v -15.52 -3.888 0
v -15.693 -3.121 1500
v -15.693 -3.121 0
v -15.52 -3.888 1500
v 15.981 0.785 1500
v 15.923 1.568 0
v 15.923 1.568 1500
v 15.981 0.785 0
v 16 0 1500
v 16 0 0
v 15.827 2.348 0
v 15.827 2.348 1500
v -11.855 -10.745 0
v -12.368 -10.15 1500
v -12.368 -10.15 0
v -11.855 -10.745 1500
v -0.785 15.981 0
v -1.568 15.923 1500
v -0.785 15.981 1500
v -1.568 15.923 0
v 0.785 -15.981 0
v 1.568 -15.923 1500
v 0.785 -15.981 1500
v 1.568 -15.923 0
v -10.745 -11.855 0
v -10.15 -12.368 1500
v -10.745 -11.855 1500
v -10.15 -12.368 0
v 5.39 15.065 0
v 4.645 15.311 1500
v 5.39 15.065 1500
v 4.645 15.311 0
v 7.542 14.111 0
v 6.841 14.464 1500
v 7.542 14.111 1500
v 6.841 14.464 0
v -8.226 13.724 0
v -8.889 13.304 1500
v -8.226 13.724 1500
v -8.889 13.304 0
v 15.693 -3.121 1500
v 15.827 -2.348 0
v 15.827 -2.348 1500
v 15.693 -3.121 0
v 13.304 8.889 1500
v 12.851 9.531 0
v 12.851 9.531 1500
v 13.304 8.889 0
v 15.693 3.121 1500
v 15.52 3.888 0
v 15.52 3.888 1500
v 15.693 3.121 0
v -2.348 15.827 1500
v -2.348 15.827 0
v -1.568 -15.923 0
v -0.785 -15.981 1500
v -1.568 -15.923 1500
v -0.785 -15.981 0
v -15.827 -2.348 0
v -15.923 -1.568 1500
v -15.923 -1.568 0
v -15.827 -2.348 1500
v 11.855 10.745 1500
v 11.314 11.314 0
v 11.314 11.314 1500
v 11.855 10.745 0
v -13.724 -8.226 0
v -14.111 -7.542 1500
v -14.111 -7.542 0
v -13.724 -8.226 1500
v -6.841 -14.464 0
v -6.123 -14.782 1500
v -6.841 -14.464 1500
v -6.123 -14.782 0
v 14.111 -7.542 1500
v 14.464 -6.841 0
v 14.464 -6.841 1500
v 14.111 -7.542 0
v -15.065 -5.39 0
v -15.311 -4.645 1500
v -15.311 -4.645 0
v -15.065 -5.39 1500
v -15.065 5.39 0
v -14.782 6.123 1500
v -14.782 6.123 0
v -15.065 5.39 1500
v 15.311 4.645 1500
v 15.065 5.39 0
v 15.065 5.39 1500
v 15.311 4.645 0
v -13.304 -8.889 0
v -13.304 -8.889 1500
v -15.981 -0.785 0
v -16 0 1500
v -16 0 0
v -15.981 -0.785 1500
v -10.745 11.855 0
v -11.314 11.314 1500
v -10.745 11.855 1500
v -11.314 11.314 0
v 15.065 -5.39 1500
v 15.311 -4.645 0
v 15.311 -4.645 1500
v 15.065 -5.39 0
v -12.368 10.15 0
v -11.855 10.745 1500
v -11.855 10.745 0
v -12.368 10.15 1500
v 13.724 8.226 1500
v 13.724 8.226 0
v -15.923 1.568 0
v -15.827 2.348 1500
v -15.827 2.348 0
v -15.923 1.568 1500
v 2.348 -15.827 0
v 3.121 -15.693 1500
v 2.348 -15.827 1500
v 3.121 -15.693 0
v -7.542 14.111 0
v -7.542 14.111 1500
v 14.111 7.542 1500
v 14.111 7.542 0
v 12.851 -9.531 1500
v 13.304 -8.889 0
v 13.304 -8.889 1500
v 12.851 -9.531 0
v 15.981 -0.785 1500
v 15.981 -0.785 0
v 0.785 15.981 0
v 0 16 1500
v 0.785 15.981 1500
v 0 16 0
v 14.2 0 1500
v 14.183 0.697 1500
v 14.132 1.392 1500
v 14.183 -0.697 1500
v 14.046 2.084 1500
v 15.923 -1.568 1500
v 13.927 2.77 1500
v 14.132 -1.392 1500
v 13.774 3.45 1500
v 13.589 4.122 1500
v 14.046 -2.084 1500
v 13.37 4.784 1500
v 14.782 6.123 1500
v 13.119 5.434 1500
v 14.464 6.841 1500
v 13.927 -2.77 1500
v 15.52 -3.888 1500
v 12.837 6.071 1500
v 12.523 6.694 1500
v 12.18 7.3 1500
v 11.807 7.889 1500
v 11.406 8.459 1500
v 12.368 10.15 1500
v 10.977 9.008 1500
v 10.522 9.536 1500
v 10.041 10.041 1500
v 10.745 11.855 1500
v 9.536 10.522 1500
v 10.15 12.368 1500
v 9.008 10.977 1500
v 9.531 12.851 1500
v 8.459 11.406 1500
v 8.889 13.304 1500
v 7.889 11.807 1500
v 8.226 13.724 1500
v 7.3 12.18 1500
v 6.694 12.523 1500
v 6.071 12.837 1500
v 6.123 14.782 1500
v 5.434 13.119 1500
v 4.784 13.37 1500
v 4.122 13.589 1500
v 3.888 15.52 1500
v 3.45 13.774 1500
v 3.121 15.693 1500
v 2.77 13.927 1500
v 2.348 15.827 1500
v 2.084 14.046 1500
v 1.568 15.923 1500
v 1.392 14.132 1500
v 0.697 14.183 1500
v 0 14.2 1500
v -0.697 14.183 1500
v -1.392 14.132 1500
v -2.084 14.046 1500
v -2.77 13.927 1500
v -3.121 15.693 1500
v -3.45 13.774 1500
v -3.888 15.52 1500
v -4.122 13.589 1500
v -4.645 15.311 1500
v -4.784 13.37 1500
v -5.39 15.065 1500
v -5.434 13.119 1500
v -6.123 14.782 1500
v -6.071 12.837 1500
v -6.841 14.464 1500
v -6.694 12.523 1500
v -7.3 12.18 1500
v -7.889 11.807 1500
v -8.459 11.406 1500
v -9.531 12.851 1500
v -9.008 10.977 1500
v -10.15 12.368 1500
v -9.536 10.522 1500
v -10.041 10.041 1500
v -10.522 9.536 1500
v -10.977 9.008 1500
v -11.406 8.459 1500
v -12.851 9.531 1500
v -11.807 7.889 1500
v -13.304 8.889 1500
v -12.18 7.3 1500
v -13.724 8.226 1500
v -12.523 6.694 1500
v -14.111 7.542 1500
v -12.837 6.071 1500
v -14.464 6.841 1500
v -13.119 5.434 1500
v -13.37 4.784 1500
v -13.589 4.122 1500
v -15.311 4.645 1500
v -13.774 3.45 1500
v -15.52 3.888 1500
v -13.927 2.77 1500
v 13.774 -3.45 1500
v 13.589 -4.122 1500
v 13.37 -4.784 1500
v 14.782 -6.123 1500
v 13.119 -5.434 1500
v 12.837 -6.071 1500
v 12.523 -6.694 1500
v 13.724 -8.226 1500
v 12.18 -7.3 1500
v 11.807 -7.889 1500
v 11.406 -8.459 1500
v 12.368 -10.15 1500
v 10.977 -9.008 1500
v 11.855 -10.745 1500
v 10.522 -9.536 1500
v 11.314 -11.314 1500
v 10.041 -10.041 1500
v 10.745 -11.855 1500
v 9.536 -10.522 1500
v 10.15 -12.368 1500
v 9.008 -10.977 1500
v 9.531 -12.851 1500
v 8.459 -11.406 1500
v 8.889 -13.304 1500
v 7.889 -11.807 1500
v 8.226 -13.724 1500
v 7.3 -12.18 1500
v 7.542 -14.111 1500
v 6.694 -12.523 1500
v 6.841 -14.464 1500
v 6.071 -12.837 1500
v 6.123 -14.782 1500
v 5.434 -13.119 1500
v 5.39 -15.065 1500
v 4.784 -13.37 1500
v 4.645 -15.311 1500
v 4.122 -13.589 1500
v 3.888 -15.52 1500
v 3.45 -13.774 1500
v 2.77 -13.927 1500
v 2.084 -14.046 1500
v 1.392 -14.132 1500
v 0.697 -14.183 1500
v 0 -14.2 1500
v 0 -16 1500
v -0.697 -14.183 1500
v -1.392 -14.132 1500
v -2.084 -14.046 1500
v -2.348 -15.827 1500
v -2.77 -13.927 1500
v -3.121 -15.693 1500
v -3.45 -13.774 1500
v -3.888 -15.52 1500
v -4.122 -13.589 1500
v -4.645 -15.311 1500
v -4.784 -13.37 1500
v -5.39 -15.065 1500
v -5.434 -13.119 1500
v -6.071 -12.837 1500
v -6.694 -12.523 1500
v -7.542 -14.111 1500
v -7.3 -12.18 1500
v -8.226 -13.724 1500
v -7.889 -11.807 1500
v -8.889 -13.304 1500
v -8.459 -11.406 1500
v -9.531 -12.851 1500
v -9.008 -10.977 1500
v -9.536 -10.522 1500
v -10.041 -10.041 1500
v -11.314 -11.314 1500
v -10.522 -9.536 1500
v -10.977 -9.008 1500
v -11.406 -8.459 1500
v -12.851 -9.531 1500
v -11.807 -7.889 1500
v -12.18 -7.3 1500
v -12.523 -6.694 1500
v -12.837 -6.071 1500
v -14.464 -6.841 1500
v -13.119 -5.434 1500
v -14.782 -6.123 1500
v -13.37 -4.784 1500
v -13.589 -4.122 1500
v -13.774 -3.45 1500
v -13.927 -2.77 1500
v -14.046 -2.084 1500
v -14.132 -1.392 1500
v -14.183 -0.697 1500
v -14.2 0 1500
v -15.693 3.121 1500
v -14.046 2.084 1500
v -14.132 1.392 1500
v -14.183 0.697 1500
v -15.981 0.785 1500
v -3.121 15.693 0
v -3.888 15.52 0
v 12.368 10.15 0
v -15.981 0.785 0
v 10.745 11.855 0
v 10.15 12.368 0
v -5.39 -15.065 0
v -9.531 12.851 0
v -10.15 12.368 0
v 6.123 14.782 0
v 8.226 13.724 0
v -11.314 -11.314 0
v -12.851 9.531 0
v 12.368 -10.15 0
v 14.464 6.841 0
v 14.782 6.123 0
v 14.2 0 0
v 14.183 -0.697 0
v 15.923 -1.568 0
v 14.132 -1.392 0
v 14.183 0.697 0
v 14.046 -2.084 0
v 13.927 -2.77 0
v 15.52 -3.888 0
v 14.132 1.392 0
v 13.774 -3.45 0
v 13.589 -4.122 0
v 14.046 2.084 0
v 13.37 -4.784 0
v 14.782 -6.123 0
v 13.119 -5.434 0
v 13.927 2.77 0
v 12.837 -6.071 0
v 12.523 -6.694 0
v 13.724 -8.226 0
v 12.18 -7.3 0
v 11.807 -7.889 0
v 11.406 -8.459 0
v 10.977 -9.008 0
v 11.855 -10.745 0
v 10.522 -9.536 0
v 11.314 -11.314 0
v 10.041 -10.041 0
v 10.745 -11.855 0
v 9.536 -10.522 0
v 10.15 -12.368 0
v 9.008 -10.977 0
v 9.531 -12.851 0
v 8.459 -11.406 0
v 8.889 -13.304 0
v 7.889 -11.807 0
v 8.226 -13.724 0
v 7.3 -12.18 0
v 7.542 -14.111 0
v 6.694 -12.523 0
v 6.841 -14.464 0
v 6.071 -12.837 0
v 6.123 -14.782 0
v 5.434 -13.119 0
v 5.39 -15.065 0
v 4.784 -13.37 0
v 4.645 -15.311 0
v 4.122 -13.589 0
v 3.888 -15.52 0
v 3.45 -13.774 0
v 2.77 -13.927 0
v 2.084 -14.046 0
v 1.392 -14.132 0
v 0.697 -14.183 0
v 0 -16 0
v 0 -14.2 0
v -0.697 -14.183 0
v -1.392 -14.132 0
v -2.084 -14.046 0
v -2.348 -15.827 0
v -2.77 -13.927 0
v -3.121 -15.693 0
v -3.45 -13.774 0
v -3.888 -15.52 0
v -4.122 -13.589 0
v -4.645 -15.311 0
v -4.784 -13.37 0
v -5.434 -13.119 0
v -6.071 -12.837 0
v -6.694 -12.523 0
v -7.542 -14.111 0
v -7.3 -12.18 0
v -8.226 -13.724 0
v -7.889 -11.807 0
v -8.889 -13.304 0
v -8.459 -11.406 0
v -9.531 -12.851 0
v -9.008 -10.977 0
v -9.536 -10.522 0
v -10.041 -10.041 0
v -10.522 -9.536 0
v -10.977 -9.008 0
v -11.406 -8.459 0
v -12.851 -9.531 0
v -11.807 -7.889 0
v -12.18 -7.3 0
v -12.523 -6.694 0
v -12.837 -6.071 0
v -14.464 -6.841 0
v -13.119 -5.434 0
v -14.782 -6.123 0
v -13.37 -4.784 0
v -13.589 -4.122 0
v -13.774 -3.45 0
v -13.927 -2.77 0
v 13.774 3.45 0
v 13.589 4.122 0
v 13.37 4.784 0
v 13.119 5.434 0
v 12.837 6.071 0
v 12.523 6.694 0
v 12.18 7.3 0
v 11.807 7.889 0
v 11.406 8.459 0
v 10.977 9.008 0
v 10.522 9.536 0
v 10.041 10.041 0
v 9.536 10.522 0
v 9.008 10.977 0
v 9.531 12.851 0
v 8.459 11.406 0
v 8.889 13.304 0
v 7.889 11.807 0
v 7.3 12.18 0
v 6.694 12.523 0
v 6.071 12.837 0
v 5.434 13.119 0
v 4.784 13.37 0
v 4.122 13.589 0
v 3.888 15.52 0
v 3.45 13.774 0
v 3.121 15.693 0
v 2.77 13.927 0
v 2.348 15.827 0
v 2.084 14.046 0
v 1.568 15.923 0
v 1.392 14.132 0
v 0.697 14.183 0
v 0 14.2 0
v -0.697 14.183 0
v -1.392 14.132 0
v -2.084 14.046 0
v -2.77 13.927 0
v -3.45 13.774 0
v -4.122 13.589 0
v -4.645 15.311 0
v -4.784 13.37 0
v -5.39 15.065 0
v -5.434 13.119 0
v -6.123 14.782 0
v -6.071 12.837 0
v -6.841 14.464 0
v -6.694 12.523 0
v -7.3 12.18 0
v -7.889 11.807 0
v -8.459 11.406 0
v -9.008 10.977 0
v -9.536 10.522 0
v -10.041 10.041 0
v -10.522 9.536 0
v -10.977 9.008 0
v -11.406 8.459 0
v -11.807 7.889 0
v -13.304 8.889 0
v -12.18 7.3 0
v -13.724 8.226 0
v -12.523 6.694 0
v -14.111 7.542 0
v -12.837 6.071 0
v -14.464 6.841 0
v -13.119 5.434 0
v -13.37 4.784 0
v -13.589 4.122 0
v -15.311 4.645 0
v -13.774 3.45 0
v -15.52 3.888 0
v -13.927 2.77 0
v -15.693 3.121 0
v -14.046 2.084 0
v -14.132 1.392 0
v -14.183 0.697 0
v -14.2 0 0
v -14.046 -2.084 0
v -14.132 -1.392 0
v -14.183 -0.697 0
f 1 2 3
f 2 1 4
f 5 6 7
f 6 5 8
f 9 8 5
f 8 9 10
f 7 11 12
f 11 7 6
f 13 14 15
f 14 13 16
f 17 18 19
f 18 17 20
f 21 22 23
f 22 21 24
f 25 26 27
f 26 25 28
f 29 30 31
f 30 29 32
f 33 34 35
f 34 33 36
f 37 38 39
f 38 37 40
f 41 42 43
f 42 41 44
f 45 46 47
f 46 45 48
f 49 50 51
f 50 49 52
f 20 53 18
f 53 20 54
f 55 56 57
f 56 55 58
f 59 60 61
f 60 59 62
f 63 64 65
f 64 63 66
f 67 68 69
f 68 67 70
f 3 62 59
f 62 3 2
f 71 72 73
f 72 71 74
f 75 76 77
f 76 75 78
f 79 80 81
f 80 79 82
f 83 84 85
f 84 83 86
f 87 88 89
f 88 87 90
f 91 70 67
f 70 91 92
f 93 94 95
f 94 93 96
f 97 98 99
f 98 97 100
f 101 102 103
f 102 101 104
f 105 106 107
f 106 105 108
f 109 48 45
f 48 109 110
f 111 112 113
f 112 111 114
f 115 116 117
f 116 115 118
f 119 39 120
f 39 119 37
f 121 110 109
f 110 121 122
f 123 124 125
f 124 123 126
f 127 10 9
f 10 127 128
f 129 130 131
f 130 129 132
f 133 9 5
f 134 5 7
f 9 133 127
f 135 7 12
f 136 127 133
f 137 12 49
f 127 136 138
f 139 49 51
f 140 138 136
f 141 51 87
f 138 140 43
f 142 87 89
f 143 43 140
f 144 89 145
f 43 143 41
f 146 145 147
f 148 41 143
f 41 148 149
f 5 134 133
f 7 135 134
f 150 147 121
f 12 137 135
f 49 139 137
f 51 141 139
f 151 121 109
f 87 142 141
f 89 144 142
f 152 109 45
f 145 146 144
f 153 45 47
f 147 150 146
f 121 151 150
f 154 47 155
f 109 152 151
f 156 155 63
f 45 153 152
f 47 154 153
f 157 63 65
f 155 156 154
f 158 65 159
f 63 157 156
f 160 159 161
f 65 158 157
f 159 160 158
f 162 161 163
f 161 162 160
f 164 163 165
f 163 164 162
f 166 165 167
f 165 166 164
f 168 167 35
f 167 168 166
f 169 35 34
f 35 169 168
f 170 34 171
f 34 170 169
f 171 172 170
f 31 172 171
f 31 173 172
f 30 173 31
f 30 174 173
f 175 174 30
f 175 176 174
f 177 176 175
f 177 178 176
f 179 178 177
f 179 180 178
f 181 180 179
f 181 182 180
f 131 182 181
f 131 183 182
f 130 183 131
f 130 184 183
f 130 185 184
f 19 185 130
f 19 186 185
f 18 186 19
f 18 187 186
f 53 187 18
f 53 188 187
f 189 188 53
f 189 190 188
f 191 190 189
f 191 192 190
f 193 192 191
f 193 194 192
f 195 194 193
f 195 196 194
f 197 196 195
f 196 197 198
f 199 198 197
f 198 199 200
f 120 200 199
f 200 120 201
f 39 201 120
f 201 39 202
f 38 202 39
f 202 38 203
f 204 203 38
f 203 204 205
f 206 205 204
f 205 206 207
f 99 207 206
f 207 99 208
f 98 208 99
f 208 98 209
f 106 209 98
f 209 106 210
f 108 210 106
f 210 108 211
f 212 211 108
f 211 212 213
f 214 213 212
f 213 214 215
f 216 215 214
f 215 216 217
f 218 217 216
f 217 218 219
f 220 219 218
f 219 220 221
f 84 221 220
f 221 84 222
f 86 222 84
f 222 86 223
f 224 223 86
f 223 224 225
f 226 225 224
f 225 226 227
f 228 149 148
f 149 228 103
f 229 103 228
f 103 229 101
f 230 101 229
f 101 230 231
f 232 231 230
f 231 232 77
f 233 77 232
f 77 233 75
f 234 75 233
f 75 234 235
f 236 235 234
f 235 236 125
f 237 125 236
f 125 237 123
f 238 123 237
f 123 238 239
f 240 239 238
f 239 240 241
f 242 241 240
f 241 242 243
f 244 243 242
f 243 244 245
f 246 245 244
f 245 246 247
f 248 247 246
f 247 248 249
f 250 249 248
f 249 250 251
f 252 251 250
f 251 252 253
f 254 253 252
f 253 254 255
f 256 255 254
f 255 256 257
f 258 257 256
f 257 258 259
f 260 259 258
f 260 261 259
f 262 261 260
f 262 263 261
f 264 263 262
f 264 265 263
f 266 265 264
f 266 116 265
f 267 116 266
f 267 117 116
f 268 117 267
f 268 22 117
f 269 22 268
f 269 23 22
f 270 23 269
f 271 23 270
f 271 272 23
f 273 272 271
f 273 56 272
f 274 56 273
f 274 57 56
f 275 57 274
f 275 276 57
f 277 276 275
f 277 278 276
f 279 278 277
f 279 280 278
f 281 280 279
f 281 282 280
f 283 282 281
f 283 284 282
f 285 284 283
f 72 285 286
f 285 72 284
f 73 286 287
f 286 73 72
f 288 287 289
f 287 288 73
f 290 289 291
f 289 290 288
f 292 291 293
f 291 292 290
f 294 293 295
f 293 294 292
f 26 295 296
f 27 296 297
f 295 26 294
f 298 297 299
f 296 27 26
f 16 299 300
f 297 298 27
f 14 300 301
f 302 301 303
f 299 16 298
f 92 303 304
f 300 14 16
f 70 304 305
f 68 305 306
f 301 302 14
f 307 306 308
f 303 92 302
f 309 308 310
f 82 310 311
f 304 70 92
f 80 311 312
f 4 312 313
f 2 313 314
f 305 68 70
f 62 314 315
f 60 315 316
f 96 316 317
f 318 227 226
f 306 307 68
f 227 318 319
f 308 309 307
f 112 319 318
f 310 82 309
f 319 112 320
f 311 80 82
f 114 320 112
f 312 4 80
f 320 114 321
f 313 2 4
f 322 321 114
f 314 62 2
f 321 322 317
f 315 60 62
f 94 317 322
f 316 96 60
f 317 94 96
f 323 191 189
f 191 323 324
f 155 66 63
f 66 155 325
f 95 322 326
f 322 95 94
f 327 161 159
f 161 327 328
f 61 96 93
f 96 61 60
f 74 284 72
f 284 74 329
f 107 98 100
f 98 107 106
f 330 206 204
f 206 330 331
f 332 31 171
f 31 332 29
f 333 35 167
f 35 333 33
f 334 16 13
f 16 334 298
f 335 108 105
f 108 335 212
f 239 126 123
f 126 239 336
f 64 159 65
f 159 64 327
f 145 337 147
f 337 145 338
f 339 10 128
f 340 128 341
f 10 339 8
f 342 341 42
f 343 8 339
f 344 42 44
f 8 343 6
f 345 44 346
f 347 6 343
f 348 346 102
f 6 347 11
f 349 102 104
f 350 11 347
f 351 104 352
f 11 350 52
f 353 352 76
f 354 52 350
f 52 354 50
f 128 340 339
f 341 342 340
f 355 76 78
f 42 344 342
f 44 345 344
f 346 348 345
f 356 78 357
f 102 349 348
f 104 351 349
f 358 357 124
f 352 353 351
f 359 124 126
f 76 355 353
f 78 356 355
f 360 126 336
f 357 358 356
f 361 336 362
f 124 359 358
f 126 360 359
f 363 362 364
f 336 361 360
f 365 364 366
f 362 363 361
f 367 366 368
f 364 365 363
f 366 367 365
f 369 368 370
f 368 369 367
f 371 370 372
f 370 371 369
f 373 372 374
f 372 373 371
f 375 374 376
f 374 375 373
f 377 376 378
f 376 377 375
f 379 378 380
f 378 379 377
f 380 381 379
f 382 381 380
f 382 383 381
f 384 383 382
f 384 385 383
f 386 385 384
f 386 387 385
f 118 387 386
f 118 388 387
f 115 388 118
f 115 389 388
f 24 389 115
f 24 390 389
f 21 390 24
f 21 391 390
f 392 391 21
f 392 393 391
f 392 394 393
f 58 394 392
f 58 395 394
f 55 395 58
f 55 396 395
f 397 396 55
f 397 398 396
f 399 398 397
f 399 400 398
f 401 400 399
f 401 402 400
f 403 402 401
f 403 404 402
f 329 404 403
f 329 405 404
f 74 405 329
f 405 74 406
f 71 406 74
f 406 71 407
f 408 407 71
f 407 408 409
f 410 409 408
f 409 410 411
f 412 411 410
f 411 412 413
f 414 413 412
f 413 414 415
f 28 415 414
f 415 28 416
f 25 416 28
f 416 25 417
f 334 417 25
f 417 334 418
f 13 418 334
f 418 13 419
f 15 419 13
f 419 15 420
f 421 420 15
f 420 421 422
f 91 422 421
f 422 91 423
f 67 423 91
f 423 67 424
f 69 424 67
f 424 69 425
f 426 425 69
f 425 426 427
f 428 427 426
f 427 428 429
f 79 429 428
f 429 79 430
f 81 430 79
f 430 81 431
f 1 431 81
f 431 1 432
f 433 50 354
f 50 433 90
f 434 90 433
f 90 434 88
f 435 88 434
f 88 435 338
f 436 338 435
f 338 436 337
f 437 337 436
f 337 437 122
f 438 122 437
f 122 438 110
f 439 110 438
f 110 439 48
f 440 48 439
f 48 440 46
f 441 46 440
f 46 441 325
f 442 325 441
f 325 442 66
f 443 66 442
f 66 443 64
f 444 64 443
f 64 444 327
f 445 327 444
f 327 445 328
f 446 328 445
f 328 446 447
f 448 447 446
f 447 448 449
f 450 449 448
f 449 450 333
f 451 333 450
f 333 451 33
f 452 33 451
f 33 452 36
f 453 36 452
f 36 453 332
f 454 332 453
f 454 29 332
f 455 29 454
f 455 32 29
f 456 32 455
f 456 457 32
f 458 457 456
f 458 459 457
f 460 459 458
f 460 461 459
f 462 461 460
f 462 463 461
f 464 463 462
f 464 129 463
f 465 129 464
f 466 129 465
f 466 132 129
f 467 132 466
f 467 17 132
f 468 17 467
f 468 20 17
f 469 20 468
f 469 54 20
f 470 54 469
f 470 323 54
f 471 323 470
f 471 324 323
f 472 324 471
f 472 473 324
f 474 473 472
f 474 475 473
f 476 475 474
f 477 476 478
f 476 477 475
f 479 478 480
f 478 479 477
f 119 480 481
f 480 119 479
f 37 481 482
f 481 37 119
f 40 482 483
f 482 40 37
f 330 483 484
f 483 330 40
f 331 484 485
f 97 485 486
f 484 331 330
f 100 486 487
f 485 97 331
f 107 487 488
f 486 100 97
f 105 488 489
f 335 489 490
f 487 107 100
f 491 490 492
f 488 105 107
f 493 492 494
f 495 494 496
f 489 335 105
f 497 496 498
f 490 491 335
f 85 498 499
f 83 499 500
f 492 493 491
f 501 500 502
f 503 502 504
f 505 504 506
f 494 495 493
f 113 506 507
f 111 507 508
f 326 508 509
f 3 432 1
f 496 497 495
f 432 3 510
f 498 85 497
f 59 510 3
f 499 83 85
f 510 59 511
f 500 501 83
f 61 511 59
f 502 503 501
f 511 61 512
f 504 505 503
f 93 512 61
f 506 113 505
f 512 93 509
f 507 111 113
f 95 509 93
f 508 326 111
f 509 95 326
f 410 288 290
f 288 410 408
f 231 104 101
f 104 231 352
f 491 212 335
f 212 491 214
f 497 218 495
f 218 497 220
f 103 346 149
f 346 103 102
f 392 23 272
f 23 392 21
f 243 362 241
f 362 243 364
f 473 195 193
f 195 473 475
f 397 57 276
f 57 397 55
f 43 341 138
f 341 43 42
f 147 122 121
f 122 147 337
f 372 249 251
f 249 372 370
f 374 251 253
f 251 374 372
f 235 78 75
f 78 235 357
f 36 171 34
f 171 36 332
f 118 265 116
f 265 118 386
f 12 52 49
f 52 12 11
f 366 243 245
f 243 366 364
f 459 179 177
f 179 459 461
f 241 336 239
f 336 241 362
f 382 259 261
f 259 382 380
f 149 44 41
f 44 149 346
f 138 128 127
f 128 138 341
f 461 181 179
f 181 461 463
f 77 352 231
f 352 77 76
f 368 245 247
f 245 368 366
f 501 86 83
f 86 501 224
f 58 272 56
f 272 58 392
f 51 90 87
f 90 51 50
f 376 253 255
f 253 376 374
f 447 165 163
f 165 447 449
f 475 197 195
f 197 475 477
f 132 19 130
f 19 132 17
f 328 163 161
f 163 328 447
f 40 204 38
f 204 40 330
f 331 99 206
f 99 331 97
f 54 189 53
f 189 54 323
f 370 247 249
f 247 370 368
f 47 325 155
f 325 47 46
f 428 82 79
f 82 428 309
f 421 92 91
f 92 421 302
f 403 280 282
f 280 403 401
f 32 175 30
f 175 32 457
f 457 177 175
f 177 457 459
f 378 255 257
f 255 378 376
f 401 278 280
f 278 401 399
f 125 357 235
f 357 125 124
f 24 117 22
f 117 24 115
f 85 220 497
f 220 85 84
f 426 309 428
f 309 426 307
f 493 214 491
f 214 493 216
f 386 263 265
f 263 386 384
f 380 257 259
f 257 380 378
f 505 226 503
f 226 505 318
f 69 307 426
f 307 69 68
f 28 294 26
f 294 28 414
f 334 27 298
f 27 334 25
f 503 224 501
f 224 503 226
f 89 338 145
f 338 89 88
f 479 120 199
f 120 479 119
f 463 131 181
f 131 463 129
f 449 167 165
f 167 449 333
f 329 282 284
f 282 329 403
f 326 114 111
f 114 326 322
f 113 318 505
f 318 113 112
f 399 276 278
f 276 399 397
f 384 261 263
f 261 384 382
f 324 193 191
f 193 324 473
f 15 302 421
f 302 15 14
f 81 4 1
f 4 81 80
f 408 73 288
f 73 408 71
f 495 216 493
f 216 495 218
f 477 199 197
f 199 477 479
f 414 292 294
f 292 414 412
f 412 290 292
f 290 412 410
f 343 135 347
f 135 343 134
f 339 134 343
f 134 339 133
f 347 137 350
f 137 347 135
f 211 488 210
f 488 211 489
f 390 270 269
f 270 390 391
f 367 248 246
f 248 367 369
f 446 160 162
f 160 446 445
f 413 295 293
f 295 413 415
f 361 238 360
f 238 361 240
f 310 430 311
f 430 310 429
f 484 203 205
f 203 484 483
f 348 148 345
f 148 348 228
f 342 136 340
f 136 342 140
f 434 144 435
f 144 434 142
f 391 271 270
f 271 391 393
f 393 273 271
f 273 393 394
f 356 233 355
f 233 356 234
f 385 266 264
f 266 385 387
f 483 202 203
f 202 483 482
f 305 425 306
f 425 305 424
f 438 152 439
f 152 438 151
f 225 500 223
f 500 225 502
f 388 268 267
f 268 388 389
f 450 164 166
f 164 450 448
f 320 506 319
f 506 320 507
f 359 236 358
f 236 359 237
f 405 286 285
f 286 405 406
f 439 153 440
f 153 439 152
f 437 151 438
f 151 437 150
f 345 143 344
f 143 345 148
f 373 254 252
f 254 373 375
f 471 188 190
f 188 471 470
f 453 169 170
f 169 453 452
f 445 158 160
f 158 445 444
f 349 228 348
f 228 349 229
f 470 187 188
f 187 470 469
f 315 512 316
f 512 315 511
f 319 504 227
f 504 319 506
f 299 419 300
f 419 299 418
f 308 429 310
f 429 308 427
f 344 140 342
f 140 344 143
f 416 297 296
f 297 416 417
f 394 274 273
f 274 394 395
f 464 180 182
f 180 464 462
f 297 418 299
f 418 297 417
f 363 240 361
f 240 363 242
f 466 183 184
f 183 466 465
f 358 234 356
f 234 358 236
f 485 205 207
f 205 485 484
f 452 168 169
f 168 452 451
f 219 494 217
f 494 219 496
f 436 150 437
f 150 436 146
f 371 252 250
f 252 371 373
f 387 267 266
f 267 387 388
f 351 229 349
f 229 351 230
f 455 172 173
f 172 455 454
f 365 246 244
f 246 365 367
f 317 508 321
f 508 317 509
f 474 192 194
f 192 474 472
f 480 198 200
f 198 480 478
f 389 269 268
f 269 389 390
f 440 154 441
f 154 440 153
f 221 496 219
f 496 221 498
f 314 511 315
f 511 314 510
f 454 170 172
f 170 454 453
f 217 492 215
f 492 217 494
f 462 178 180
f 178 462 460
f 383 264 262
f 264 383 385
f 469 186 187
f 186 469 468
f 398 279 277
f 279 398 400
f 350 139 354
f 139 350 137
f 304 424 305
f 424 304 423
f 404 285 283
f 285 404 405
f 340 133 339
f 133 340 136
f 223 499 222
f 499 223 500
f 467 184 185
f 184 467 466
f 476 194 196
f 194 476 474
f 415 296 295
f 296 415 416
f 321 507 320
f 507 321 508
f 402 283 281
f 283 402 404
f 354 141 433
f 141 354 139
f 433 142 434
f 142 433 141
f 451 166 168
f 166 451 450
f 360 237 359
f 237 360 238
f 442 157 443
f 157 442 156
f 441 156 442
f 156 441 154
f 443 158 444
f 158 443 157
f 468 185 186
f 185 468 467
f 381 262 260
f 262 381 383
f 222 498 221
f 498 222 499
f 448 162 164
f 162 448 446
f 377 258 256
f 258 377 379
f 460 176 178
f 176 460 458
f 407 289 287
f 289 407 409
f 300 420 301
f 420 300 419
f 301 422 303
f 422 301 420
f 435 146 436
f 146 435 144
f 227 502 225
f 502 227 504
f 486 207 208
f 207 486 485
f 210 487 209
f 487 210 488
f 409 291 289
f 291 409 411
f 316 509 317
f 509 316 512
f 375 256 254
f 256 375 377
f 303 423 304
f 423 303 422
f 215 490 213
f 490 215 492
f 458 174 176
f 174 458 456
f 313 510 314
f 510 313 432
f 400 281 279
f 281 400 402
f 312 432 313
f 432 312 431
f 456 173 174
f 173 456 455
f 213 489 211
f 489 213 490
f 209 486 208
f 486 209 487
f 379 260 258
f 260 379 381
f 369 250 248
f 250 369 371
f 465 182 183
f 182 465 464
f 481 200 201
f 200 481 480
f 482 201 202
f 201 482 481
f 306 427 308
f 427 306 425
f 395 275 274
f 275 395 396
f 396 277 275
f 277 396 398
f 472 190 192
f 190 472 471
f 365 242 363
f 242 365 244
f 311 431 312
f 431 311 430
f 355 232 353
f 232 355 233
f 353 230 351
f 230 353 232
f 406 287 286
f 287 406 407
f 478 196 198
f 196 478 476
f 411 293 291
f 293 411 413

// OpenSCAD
$fn = 128;

// HT pipe parameters (approximate for HT 32)
outer_d = 32;          // mm
wall_th = 1.8;         // mm (typical range ~1.8-2.0 for 32mm; adjust if needed)
inner_d = outer_d - 2*wall_th;

length = 1500;         // mm

module ht_pipe(od, id, L) {
    difference() {
        cylinder(h = L, d = od);
        translate([0,0,-0.5])
            cylinder(h = L + 1.0, d = id);
    }
}

ht_pipe(outer_d, inner_d, length);
